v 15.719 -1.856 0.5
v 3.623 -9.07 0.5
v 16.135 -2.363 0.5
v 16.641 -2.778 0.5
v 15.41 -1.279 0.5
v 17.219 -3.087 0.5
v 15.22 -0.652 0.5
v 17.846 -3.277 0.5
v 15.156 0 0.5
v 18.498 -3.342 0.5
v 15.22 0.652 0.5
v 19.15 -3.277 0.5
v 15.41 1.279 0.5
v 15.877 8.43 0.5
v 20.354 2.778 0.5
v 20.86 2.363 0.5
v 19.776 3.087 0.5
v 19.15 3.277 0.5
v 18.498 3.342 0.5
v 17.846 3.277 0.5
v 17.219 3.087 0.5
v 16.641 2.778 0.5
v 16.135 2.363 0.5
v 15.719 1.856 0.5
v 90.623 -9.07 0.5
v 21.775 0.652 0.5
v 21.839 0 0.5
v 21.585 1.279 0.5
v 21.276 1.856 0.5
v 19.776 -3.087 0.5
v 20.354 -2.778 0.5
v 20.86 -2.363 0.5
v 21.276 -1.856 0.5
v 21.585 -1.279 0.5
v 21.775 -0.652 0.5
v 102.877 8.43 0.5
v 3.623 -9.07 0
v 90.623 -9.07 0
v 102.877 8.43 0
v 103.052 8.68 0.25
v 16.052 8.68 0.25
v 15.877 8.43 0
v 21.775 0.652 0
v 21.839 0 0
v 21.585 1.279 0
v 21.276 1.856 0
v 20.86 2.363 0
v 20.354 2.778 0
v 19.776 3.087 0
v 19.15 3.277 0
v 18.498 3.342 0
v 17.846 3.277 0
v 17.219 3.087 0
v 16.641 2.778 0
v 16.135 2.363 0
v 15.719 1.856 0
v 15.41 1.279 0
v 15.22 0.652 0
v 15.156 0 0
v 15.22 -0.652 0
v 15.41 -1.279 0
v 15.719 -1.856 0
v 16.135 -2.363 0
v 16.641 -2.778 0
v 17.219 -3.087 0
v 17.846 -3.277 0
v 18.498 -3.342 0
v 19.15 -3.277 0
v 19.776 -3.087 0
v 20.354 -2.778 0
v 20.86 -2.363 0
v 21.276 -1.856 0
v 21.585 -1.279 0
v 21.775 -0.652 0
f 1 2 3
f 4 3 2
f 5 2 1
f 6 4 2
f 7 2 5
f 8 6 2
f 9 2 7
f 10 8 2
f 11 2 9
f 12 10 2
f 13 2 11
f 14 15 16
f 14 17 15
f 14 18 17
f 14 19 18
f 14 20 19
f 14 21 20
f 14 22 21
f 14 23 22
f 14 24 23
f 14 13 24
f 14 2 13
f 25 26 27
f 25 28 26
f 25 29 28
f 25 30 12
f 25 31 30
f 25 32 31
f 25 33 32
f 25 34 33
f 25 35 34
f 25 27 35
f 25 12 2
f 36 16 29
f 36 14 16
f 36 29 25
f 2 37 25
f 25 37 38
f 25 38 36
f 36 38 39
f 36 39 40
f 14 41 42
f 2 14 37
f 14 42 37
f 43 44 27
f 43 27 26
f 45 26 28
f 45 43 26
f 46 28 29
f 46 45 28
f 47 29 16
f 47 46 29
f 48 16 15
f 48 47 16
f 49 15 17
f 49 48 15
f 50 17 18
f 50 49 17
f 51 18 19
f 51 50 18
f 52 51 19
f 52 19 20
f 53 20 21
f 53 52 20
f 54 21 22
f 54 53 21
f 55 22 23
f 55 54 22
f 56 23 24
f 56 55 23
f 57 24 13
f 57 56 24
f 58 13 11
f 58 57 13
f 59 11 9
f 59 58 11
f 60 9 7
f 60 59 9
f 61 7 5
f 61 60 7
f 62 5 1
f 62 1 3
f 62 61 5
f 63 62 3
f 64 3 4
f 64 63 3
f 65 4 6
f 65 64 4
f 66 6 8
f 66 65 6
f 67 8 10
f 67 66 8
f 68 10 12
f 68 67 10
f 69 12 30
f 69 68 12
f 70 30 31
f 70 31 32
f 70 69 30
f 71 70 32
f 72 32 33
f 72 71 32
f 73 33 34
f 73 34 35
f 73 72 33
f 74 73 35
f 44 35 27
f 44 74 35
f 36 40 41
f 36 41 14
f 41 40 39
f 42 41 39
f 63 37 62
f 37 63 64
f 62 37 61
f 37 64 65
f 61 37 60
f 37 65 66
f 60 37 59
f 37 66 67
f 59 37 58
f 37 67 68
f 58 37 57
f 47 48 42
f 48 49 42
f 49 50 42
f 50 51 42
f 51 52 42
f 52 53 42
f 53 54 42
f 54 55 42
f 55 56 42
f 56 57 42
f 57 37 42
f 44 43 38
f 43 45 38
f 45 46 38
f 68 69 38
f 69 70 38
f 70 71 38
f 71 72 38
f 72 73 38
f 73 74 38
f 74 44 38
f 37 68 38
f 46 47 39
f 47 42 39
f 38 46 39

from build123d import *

# Parameters (mm, degrees)
F0_R        = 3.341537713
F1_DEPTH    = 0.5
F2_T1_DEPTH = 89.571682988


# Not quite as in the source:
# - a fillet or chamfer that OpenCascade refuses, or shapes differently, is made with other operations: its cross-section is extruded or revolved along the edge and cut away or added


with BuildPart() as f1:
    # F0 (on Top) → F1 (new body)
    with BuildSketch(Plane.XY):
        Polygon((16.2269707607, 8.9300729632), (3.6232350729, -9.0699270368), (90.6232350729, -9.0699270368), (103.2269707607, 8.9300729632), align=None)
        with Locations((18.4976458549, 0)):
            Circle(F0_R, mode=Mode.SUBTRACT)
    extrude(amount=F1_DEPTH)

    # F2: chamfer of 0.5 on 2 edges, made by hand

    # F2_s2 → F2_t1 (cut)
    with BuildSketch(Plane.YZ.offset(14.9411292667)):
        Polygon((8.9300729632, 0), (8.4300729632, 0.5), (8.9300729632, 0.5), align=None)
        Polygon((8.9300729632, 0.5), (8.4300729632, 0), (8.9300729632, 0), align=None)
    extrude(amount=F2_T1_DEPTH, mode=Mode.SUBTRACT)


solid = f1.part
